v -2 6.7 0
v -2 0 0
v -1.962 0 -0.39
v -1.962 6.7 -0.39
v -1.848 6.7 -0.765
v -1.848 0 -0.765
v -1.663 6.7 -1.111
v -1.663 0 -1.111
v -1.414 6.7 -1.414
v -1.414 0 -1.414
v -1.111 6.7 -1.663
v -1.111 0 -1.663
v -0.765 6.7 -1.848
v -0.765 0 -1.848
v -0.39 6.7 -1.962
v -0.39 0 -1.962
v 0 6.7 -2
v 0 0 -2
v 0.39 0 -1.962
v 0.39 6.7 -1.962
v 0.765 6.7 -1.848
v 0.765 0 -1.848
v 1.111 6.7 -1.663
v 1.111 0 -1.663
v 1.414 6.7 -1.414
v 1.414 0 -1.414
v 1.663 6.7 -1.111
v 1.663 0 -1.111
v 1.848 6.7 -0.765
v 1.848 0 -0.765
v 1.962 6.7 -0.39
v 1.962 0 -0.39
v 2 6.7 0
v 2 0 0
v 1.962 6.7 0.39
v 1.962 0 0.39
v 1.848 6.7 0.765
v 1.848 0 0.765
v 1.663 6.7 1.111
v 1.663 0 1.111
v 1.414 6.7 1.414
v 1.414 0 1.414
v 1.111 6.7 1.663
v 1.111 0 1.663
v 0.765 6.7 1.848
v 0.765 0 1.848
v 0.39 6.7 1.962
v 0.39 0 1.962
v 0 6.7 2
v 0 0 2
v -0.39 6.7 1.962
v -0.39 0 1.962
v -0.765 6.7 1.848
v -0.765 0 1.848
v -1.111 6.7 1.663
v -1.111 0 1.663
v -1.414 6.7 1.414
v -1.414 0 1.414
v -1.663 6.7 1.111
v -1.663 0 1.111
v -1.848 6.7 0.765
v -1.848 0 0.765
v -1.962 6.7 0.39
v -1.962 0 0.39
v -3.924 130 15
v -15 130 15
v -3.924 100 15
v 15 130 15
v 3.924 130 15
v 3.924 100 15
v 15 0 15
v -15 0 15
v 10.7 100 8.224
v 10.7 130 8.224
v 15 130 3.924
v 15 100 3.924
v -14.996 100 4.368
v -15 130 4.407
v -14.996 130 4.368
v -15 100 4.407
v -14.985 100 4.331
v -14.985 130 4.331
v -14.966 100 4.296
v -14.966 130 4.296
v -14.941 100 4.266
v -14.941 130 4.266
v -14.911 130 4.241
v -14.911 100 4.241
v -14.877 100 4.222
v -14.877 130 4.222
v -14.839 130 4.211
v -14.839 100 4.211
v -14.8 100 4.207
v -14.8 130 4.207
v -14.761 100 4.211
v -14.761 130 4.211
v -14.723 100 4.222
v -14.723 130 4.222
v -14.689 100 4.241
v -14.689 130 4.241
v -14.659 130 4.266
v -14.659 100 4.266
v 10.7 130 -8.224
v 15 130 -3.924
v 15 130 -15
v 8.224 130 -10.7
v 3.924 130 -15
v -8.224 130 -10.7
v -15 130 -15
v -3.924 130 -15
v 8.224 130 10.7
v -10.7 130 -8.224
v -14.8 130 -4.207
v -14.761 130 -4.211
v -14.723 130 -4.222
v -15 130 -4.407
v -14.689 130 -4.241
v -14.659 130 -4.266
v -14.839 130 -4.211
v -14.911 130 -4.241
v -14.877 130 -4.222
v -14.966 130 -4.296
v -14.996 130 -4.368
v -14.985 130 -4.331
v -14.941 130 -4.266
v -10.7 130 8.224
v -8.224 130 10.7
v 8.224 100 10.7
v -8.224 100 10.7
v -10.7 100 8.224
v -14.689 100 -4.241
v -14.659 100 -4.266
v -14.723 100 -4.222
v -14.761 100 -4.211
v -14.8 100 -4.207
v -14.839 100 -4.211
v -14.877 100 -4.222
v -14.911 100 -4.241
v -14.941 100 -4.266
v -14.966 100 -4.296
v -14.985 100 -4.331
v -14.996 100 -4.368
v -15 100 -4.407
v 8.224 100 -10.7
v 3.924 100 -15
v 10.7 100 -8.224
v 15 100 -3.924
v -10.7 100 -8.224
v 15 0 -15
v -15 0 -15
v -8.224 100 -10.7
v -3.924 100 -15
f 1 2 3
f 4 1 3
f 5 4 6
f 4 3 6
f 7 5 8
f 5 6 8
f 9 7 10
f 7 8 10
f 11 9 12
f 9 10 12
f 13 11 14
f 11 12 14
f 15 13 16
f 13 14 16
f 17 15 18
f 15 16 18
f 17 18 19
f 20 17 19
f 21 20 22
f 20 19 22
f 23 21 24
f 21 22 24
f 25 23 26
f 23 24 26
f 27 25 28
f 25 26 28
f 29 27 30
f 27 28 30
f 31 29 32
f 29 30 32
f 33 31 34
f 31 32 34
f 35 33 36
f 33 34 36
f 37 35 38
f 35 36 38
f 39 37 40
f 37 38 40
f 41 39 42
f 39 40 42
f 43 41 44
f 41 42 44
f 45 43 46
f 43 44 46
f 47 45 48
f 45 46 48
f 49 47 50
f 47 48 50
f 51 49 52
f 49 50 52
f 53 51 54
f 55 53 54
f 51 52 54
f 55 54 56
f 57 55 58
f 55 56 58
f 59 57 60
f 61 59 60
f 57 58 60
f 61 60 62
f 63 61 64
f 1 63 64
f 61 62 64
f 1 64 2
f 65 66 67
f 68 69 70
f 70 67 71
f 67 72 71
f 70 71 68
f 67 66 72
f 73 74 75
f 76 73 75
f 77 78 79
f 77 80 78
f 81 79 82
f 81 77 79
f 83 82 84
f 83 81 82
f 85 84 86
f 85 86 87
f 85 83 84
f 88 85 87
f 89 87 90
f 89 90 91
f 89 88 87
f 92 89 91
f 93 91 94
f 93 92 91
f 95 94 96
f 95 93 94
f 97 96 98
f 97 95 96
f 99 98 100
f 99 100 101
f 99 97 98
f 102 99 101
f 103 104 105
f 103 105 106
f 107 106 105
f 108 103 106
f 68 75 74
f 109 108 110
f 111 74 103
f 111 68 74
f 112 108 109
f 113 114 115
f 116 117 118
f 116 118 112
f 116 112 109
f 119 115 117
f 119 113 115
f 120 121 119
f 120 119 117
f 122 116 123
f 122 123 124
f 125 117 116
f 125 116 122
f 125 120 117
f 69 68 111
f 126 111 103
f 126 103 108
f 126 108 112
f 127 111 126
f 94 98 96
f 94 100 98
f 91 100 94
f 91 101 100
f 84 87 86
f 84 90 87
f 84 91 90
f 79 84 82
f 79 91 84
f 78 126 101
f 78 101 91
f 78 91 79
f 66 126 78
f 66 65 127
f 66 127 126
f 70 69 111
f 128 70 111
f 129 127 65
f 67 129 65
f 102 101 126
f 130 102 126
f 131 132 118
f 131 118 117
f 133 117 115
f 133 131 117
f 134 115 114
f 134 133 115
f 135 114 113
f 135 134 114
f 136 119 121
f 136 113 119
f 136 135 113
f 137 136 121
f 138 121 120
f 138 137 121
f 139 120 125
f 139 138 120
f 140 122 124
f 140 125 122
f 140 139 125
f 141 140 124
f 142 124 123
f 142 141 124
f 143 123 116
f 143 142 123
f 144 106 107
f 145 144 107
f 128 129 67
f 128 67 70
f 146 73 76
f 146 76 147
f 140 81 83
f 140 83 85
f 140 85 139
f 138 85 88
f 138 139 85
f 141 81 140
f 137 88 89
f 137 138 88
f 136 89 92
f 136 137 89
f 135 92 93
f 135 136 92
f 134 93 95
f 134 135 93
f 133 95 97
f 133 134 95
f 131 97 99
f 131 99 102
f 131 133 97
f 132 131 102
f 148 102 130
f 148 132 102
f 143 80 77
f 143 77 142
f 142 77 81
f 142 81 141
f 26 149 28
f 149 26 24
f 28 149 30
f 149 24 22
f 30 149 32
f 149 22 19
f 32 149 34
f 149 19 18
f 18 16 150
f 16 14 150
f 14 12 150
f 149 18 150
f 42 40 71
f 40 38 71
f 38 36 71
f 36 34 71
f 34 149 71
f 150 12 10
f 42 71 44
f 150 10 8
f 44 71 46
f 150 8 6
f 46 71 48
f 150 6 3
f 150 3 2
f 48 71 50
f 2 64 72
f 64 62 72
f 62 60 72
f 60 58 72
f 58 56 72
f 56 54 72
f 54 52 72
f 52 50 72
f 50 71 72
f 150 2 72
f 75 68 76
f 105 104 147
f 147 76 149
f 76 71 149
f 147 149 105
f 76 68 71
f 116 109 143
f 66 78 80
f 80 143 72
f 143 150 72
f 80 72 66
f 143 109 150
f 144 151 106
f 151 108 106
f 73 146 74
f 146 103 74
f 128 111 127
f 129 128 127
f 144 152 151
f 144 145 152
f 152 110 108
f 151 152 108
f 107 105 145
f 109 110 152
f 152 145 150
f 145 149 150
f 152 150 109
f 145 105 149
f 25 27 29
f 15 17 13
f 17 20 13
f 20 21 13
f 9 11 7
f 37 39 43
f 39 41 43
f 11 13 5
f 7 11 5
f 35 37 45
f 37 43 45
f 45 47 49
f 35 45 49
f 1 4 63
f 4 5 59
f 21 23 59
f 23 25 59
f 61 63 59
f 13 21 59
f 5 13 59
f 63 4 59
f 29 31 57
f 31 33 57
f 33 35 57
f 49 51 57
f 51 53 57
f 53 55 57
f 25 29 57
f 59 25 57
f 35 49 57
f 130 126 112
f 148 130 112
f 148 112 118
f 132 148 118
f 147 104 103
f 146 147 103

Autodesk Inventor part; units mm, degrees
ref_plane "YZ Plane" through (0, 0, 0) normal (1, 0, 0) x (0, 1, 0)
ref_plane "XZ Plane" through (0, 0, 0) normal (0, 1, 0) x (-1, 0, 0)
ref_plane "XY Plane" through (0, 0, 0) normal (0, 0, 1) x (1, 0, 0)
sketch "Skizze1" plane through (0, 0, 0) normal (0, 1, 0) x (-1, 0, 0)
  line L0 (25.085, 0) -> (-63.4246, 0)
  line L1 (0, 50.1146) -> (0, -66.9502)
  line L2 (15, 15) -> (-15, 15)
  line L3 (-15, 15) -> (-15, -15)
  line L4 (-15, -15) -> (15, -15)
  line L5 (15, -15) -> (15, 15)
  line L6 (15, 15) -> (-15, -15) construction
  line L7 (-15, 15) -> (15, -15) construction
  circle A0 centre (0, 0) radius 2
  dimension "d0" = 30
  dimension "d1" = 30
  dimension "d24" = 4
extrude "Extrusion1" add sketch "Skizze1" along normal blind 130
sketch "Skizze3" plane through (0, 130, 0) normal (0, 1, 0) x (1, 0, 0)
  line L0 (18.5438, 0) -> (-21.4353, 0) construction
  line L1 (-11, 7.5) -> (-11, -7.5)
  line L2 (-15, 15) -> (-15, -15) projected
  line L3 (15, 15) -> (-15, 15) projected
  line L4 (-11, 7.5) -> (-15, 3.5)
  line L5 (-11, -7.5) -> (-15, -3.5)
  line L6 (-15.2121, -3.7121) -> (-10.7, -8.2243)
  line L7 (-10.7, -8.2243) -> (-10.7, 8.2243)
  line L8 (-10.7, 8.2243) -> (-15.2121, 3.7121)
  line L9 (-15, -3.9243) -> (-15, 3.9243)
  line L10 (3.7121, -15.2121) -> (8.2243, -10.7)
  line L11 (8.2243, -10.7) -> (-8.2243, -10.7)
  line L12 (-8.2243, -10.7) -> (-3.7121, -15.2121)
  line L13 (3.9243, -15) -> (-3.9243, -15)
  line L14 (15.2121, 3.7121) -> (10.7, 8.2243)
  line L15 (10.7, 8.2243) -> (10.7, -8.2243)
  line L16 (10.7, -8.2243) -> (15.2121, -3.7121)
  line L17 (15, 3.9243) -> (15, -3.9243)
  line L18 (-3.7121, 15.2121) -> (-8.2243, 10.7)
  line L19 (-8.2243, 10.7) -> (8.2243, 10.7)
  line L20 (8.2243, 10.7) -> (3.7121, 15.2121)
  line L21 (-3.9243, 15) -> (3.9243, 15)
  point P0 (0, 0)
  point P1 (3.9243, 15)
  point P2 (-3.9243, 15)
  dimension "d11" = 4
  dimension "d12" = 15
  dimension "d13" = 7.5
  dimension "d14" = 45
  dimension "d15" = 45
  dimension "d18" = 0.3
  dimension "d22" = 360
extrude "Extrusion3" cut sketch "Skizze3" against normal blind 30
fillet "Rundung1" radius 0.2 2 edges at (-15, 115, 3.9243) (-15, 115, -3.9243)
extrude "Extrusion4" cut sketch "Skizze1" along normal blind 6.7 contours A0 L1 L0 | L0 L1 A0 | L1 A0 L0 | L0 A0 L1
properties part number "CarlaRescueRampeTeil1"
